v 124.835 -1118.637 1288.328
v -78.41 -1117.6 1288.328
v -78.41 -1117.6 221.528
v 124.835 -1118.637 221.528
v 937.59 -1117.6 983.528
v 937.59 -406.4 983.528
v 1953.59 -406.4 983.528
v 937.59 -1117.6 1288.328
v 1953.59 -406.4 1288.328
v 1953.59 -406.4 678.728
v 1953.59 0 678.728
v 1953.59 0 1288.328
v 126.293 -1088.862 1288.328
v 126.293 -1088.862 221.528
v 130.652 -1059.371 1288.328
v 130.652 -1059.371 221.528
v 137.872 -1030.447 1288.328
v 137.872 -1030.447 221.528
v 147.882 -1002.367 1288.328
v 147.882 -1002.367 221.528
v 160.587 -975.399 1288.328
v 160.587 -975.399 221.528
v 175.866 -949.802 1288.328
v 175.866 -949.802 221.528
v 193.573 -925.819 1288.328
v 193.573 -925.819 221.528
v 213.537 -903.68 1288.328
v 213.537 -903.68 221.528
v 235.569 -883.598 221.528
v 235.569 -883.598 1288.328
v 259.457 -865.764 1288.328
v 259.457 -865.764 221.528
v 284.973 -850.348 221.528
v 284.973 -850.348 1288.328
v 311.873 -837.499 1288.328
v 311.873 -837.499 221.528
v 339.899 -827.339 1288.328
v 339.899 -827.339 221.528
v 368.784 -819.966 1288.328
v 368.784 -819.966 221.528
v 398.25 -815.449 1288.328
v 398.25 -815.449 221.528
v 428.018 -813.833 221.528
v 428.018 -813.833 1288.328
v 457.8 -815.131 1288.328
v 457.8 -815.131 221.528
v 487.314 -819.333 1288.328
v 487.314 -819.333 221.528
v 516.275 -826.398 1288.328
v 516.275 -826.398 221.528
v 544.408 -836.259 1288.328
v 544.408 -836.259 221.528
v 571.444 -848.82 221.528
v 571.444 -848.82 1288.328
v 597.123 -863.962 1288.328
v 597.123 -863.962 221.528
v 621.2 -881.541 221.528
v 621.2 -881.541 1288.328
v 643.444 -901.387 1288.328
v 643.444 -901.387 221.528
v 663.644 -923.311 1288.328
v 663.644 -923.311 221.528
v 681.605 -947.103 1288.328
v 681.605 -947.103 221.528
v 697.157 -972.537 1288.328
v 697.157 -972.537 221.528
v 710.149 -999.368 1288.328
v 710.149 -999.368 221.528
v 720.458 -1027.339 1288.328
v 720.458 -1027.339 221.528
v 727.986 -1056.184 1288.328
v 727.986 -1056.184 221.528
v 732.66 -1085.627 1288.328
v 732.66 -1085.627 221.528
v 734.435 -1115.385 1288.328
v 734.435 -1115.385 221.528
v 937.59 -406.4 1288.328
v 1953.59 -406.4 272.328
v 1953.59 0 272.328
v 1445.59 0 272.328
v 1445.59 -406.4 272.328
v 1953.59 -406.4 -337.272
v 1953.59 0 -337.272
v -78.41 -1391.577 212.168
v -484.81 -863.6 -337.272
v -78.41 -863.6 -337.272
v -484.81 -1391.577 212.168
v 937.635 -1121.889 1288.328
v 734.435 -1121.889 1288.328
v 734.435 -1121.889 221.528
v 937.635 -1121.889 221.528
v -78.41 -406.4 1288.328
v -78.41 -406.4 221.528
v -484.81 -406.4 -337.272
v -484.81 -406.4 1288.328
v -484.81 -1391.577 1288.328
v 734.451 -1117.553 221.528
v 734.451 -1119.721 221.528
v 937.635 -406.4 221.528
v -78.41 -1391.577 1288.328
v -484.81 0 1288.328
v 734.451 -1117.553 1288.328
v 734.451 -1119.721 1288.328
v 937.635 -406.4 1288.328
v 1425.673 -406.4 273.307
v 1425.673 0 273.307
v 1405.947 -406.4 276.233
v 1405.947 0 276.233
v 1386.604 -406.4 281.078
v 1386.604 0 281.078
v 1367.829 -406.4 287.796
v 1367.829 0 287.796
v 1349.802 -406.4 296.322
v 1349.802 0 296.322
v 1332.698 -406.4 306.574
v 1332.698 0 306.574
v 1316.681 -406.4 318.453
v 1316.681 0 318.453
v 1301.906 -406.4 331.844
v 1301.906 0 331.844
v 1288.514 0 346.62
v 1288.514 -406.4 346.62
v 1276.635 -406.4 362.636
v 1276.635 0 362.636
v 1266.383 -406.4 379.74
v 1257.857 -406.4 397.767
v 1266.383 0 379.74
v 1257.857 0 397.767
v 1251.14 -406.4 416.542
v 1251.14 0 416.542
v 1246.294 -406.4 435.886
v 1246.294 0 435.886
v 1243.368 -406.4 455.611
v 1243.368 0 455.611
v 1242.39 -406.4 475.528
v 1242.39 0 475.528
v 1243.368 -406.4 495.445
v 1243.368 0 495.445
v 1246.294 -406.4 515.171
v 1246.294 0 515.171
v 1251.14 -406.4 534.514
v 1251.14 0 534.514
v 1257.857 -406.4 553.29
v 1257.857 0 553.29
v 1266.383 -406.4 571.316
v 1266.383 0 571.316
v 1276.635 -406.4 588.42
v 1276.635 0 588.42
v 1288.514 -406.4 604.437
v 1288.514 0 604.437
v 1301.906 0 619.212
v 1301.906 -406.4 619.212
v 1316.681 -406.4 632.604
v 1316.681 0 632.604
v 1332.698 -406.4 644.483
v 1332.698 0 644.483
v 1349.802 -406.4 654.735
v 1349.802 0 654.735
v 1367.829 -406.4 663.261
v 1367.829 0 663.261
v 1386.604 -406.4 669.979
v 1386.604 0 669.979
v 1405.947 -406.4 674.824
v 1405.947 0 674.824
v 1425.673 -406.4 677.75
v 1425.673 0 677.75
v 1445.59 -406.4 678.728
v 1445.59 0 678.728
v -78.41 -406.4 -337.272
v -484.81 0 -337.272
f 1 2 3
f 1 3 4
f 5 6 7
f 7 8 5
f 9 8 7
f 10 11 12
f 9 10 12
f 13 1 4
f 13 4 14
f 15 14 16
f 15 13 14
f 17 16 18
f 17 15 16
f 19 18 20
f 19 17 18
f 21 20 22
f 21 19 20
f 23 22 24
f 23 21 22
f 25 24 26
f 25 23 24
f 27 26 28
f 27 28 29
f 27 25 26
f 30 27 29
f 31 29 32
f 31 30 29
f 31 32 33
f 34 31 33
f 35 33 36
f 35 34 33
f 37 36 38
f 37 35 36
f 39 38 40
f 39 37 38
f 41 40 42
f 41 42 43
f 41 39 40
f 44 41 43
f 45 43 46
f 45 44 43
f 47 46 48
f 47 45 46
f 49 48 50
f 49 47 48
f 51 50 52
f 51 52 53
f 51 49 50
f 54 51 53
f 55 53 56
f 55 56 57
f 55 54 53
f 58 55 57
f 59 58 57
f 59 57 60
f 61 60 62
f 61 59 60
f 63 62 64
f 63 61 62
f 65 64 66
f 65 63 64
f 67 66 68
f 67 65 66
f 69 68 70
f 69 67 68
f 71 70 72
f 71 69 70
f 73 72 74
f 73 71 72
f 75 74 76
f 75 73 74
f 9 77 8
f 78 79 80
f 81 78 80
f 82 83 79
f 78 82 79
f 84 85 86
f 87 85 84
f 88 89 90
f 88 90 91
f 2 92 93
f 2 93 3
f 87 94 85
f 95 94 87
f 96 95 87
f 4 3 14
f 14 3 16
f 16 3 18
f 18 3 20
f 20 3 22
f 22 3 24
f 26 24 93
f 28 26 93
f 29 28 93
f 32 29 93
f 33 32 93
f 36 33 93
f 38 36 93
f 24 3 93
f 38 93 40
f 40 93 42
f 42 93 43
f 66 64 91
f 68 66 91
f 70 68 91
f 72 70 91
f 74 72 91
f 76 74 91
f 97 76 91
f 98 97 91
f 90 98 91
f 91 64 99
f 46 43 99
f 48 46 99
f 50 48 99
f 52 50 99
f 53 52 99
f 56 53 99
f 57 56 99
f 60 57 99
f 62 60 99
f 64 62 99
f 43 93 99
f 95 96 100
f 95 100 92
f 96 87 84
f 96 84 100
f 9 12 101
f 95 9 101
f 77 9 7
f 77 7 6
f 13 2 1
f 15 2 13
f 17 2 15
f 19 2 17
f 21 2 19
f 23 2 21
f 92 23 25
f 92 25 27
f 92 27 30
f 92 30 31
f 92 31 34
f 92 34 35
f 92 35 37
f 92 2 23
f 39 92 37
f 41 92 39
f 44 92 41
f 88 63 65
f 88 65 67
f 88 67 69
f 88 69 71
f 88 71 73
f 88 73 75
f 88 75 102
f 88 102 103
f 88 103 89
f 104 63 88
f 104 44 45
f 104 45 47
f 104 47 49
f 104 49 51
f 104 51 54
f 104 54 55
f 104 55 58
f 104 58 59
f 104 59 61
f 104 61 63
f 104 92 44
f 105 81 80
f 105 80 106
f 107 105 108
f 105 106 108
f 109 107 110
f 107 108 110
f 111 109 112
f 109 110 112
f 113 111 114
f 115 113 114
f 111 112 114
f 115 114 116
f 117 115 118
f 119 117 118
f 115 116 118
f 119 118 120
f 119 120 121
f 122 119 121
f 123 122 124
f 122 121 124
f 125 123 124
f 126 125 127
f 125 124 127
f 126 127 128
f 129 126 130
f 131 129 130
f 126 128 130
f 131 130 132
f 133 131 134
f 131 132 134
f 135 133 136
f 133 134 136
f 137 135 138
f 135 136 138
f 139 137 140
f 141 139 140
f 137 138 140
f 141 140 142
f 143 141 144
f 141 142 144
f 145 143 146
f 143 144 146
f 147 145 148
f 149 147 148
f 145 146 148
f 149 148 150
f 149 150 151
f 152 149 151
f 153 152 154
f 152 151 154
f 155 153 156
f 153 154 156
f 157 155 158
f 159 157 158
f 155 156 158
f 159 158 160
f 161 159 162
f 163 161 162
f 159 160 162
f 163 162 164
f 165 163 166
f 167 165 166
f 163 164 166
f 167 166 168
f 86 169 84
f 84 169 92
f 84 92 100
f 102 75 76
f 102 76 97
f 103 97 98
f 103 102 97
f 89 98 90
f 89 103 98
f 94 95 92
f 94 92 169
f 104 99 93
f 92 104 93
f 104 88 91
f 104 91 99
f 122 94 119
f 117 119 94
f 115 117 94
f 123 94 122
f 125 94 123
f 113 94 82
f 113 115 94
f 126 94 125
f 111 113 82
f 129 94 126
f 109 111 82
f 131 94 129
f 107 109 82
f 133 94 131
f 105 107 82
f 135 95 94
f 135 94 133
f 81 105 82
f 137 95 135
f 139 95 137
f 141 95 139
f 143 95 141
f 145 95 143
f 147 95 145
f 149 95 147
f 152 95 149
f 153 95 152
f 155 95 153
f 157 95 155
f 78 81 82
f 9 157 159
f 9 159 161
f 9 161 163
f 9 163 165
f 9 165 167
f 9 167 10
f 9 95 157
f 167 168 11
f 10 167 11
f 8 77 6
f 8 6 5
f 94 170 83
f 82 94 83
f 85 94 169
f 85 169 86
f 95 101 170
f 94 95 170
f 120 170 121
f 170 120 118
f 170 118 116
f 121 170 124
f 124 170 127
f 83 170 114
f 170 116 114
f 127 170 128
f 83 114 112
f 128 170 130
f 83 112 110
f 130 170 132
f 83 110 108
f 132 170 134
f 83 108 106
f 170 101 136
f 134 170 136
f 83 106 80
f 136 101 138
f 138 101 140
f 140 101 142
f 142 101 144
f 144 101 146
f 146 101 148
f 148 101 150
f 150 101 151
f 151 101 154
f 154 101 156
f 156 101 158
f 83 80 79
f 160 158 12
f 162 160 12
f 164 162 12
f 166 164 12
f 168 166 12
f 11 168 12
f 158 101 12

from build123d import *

# Parameters (mm, degrees)
F1_DEPTH = 406.4
F3_DEPTH = 304.8
F5_DEPTH = 1066.8
F7_DEPTH = 406.4


with BuildPart() as f1:
    # F0 (on Front) → F1 (new body)
    with BuildSketch(Plane.XZ):
        with BuildLine():
            Line((-484.81019, 1288.32825), (-484.81019, -337.27175))
            Line((-484.81019, -337.27175), (1953.58981, -337.27175))
            Line((1953.58981, -337.27175), (1953.58981, 272.32825))
            Line((1953.58981, 272.32825), (1445.58981, 272.32825))
            ThreePointArc((1445.58981, 272.32825), (1242.38981, 475.52825), (1445.58981, 678.72825))
            Line((1445.58981, 678.72825), (1953.58981, 678.72825))
            Line((1953.58981, 678.72825), (1953.58981, 1288.32825))
            Line((1953.58981, 1288.32825), (-484.81019, 1288.32825))
        make_face()
    extrude(amount=F1_DEPTH)


with BuildPart() as f3:
    # F2 (on face) → F3 (new body)
    with BuildSketch(Plane.XY.offset(1288.32825)):
        Polygon((1953.58981, -406.4), (937.58981, -406.4), (937.58981, -1117.6), align=None)
    extrude(amount=-F3_DEPTH)


with BuildPart() as f5:
    # F4 (on face) → F5 (new body)
    with BuildSketch(Plane.XY.offset(1288.32825)):
        with BuildLine():
            Line((937.635082, -406.4), (-78.41019, -406.4))
            Line((-78.41019, -406.4), (-78.41019, -1003.772673))
            Line((-78.41019, -1003.772673), (-78.41019, -1117.6))
            Line((-78.41019, -1117.6), (124.835082, -1118.636847))
            ThreePointArc((124.835082, -1118.636847), (428.017615, -813.832509), (734.435082, -1115.384608))
            ThreePointArc((734.435082, -1115.384608), (734.452433, -1118.636847), (734.435082, -1121.889085))
            Line((734.435082, -1121.889085), (937.635082, -1121.889085))
            Line((937.635082, -1121.889085), (937.635082, -406.4))
        make_face()
    extrude(amount=-F5_DEPTH)


with BuildPart() as f7:
    # F6 (on face) → F7 (new body)
    with BuildSketch(Plane(origin=(-484.81019, 0, 0), x_dir=(0, -1, 0), z_dir=(-1, 0, 0))):
        Polygon((406.4, 1288.32825), (406.4, -337.27175), (863.6, -337.27175), (1391.577024, 212.168203), (1391.577024, 1288.32825), align=None)
    extrude(amount=-F7_DEPTH)


solid = Compound([f1.part, f3.part, f5.part, f7.part])
